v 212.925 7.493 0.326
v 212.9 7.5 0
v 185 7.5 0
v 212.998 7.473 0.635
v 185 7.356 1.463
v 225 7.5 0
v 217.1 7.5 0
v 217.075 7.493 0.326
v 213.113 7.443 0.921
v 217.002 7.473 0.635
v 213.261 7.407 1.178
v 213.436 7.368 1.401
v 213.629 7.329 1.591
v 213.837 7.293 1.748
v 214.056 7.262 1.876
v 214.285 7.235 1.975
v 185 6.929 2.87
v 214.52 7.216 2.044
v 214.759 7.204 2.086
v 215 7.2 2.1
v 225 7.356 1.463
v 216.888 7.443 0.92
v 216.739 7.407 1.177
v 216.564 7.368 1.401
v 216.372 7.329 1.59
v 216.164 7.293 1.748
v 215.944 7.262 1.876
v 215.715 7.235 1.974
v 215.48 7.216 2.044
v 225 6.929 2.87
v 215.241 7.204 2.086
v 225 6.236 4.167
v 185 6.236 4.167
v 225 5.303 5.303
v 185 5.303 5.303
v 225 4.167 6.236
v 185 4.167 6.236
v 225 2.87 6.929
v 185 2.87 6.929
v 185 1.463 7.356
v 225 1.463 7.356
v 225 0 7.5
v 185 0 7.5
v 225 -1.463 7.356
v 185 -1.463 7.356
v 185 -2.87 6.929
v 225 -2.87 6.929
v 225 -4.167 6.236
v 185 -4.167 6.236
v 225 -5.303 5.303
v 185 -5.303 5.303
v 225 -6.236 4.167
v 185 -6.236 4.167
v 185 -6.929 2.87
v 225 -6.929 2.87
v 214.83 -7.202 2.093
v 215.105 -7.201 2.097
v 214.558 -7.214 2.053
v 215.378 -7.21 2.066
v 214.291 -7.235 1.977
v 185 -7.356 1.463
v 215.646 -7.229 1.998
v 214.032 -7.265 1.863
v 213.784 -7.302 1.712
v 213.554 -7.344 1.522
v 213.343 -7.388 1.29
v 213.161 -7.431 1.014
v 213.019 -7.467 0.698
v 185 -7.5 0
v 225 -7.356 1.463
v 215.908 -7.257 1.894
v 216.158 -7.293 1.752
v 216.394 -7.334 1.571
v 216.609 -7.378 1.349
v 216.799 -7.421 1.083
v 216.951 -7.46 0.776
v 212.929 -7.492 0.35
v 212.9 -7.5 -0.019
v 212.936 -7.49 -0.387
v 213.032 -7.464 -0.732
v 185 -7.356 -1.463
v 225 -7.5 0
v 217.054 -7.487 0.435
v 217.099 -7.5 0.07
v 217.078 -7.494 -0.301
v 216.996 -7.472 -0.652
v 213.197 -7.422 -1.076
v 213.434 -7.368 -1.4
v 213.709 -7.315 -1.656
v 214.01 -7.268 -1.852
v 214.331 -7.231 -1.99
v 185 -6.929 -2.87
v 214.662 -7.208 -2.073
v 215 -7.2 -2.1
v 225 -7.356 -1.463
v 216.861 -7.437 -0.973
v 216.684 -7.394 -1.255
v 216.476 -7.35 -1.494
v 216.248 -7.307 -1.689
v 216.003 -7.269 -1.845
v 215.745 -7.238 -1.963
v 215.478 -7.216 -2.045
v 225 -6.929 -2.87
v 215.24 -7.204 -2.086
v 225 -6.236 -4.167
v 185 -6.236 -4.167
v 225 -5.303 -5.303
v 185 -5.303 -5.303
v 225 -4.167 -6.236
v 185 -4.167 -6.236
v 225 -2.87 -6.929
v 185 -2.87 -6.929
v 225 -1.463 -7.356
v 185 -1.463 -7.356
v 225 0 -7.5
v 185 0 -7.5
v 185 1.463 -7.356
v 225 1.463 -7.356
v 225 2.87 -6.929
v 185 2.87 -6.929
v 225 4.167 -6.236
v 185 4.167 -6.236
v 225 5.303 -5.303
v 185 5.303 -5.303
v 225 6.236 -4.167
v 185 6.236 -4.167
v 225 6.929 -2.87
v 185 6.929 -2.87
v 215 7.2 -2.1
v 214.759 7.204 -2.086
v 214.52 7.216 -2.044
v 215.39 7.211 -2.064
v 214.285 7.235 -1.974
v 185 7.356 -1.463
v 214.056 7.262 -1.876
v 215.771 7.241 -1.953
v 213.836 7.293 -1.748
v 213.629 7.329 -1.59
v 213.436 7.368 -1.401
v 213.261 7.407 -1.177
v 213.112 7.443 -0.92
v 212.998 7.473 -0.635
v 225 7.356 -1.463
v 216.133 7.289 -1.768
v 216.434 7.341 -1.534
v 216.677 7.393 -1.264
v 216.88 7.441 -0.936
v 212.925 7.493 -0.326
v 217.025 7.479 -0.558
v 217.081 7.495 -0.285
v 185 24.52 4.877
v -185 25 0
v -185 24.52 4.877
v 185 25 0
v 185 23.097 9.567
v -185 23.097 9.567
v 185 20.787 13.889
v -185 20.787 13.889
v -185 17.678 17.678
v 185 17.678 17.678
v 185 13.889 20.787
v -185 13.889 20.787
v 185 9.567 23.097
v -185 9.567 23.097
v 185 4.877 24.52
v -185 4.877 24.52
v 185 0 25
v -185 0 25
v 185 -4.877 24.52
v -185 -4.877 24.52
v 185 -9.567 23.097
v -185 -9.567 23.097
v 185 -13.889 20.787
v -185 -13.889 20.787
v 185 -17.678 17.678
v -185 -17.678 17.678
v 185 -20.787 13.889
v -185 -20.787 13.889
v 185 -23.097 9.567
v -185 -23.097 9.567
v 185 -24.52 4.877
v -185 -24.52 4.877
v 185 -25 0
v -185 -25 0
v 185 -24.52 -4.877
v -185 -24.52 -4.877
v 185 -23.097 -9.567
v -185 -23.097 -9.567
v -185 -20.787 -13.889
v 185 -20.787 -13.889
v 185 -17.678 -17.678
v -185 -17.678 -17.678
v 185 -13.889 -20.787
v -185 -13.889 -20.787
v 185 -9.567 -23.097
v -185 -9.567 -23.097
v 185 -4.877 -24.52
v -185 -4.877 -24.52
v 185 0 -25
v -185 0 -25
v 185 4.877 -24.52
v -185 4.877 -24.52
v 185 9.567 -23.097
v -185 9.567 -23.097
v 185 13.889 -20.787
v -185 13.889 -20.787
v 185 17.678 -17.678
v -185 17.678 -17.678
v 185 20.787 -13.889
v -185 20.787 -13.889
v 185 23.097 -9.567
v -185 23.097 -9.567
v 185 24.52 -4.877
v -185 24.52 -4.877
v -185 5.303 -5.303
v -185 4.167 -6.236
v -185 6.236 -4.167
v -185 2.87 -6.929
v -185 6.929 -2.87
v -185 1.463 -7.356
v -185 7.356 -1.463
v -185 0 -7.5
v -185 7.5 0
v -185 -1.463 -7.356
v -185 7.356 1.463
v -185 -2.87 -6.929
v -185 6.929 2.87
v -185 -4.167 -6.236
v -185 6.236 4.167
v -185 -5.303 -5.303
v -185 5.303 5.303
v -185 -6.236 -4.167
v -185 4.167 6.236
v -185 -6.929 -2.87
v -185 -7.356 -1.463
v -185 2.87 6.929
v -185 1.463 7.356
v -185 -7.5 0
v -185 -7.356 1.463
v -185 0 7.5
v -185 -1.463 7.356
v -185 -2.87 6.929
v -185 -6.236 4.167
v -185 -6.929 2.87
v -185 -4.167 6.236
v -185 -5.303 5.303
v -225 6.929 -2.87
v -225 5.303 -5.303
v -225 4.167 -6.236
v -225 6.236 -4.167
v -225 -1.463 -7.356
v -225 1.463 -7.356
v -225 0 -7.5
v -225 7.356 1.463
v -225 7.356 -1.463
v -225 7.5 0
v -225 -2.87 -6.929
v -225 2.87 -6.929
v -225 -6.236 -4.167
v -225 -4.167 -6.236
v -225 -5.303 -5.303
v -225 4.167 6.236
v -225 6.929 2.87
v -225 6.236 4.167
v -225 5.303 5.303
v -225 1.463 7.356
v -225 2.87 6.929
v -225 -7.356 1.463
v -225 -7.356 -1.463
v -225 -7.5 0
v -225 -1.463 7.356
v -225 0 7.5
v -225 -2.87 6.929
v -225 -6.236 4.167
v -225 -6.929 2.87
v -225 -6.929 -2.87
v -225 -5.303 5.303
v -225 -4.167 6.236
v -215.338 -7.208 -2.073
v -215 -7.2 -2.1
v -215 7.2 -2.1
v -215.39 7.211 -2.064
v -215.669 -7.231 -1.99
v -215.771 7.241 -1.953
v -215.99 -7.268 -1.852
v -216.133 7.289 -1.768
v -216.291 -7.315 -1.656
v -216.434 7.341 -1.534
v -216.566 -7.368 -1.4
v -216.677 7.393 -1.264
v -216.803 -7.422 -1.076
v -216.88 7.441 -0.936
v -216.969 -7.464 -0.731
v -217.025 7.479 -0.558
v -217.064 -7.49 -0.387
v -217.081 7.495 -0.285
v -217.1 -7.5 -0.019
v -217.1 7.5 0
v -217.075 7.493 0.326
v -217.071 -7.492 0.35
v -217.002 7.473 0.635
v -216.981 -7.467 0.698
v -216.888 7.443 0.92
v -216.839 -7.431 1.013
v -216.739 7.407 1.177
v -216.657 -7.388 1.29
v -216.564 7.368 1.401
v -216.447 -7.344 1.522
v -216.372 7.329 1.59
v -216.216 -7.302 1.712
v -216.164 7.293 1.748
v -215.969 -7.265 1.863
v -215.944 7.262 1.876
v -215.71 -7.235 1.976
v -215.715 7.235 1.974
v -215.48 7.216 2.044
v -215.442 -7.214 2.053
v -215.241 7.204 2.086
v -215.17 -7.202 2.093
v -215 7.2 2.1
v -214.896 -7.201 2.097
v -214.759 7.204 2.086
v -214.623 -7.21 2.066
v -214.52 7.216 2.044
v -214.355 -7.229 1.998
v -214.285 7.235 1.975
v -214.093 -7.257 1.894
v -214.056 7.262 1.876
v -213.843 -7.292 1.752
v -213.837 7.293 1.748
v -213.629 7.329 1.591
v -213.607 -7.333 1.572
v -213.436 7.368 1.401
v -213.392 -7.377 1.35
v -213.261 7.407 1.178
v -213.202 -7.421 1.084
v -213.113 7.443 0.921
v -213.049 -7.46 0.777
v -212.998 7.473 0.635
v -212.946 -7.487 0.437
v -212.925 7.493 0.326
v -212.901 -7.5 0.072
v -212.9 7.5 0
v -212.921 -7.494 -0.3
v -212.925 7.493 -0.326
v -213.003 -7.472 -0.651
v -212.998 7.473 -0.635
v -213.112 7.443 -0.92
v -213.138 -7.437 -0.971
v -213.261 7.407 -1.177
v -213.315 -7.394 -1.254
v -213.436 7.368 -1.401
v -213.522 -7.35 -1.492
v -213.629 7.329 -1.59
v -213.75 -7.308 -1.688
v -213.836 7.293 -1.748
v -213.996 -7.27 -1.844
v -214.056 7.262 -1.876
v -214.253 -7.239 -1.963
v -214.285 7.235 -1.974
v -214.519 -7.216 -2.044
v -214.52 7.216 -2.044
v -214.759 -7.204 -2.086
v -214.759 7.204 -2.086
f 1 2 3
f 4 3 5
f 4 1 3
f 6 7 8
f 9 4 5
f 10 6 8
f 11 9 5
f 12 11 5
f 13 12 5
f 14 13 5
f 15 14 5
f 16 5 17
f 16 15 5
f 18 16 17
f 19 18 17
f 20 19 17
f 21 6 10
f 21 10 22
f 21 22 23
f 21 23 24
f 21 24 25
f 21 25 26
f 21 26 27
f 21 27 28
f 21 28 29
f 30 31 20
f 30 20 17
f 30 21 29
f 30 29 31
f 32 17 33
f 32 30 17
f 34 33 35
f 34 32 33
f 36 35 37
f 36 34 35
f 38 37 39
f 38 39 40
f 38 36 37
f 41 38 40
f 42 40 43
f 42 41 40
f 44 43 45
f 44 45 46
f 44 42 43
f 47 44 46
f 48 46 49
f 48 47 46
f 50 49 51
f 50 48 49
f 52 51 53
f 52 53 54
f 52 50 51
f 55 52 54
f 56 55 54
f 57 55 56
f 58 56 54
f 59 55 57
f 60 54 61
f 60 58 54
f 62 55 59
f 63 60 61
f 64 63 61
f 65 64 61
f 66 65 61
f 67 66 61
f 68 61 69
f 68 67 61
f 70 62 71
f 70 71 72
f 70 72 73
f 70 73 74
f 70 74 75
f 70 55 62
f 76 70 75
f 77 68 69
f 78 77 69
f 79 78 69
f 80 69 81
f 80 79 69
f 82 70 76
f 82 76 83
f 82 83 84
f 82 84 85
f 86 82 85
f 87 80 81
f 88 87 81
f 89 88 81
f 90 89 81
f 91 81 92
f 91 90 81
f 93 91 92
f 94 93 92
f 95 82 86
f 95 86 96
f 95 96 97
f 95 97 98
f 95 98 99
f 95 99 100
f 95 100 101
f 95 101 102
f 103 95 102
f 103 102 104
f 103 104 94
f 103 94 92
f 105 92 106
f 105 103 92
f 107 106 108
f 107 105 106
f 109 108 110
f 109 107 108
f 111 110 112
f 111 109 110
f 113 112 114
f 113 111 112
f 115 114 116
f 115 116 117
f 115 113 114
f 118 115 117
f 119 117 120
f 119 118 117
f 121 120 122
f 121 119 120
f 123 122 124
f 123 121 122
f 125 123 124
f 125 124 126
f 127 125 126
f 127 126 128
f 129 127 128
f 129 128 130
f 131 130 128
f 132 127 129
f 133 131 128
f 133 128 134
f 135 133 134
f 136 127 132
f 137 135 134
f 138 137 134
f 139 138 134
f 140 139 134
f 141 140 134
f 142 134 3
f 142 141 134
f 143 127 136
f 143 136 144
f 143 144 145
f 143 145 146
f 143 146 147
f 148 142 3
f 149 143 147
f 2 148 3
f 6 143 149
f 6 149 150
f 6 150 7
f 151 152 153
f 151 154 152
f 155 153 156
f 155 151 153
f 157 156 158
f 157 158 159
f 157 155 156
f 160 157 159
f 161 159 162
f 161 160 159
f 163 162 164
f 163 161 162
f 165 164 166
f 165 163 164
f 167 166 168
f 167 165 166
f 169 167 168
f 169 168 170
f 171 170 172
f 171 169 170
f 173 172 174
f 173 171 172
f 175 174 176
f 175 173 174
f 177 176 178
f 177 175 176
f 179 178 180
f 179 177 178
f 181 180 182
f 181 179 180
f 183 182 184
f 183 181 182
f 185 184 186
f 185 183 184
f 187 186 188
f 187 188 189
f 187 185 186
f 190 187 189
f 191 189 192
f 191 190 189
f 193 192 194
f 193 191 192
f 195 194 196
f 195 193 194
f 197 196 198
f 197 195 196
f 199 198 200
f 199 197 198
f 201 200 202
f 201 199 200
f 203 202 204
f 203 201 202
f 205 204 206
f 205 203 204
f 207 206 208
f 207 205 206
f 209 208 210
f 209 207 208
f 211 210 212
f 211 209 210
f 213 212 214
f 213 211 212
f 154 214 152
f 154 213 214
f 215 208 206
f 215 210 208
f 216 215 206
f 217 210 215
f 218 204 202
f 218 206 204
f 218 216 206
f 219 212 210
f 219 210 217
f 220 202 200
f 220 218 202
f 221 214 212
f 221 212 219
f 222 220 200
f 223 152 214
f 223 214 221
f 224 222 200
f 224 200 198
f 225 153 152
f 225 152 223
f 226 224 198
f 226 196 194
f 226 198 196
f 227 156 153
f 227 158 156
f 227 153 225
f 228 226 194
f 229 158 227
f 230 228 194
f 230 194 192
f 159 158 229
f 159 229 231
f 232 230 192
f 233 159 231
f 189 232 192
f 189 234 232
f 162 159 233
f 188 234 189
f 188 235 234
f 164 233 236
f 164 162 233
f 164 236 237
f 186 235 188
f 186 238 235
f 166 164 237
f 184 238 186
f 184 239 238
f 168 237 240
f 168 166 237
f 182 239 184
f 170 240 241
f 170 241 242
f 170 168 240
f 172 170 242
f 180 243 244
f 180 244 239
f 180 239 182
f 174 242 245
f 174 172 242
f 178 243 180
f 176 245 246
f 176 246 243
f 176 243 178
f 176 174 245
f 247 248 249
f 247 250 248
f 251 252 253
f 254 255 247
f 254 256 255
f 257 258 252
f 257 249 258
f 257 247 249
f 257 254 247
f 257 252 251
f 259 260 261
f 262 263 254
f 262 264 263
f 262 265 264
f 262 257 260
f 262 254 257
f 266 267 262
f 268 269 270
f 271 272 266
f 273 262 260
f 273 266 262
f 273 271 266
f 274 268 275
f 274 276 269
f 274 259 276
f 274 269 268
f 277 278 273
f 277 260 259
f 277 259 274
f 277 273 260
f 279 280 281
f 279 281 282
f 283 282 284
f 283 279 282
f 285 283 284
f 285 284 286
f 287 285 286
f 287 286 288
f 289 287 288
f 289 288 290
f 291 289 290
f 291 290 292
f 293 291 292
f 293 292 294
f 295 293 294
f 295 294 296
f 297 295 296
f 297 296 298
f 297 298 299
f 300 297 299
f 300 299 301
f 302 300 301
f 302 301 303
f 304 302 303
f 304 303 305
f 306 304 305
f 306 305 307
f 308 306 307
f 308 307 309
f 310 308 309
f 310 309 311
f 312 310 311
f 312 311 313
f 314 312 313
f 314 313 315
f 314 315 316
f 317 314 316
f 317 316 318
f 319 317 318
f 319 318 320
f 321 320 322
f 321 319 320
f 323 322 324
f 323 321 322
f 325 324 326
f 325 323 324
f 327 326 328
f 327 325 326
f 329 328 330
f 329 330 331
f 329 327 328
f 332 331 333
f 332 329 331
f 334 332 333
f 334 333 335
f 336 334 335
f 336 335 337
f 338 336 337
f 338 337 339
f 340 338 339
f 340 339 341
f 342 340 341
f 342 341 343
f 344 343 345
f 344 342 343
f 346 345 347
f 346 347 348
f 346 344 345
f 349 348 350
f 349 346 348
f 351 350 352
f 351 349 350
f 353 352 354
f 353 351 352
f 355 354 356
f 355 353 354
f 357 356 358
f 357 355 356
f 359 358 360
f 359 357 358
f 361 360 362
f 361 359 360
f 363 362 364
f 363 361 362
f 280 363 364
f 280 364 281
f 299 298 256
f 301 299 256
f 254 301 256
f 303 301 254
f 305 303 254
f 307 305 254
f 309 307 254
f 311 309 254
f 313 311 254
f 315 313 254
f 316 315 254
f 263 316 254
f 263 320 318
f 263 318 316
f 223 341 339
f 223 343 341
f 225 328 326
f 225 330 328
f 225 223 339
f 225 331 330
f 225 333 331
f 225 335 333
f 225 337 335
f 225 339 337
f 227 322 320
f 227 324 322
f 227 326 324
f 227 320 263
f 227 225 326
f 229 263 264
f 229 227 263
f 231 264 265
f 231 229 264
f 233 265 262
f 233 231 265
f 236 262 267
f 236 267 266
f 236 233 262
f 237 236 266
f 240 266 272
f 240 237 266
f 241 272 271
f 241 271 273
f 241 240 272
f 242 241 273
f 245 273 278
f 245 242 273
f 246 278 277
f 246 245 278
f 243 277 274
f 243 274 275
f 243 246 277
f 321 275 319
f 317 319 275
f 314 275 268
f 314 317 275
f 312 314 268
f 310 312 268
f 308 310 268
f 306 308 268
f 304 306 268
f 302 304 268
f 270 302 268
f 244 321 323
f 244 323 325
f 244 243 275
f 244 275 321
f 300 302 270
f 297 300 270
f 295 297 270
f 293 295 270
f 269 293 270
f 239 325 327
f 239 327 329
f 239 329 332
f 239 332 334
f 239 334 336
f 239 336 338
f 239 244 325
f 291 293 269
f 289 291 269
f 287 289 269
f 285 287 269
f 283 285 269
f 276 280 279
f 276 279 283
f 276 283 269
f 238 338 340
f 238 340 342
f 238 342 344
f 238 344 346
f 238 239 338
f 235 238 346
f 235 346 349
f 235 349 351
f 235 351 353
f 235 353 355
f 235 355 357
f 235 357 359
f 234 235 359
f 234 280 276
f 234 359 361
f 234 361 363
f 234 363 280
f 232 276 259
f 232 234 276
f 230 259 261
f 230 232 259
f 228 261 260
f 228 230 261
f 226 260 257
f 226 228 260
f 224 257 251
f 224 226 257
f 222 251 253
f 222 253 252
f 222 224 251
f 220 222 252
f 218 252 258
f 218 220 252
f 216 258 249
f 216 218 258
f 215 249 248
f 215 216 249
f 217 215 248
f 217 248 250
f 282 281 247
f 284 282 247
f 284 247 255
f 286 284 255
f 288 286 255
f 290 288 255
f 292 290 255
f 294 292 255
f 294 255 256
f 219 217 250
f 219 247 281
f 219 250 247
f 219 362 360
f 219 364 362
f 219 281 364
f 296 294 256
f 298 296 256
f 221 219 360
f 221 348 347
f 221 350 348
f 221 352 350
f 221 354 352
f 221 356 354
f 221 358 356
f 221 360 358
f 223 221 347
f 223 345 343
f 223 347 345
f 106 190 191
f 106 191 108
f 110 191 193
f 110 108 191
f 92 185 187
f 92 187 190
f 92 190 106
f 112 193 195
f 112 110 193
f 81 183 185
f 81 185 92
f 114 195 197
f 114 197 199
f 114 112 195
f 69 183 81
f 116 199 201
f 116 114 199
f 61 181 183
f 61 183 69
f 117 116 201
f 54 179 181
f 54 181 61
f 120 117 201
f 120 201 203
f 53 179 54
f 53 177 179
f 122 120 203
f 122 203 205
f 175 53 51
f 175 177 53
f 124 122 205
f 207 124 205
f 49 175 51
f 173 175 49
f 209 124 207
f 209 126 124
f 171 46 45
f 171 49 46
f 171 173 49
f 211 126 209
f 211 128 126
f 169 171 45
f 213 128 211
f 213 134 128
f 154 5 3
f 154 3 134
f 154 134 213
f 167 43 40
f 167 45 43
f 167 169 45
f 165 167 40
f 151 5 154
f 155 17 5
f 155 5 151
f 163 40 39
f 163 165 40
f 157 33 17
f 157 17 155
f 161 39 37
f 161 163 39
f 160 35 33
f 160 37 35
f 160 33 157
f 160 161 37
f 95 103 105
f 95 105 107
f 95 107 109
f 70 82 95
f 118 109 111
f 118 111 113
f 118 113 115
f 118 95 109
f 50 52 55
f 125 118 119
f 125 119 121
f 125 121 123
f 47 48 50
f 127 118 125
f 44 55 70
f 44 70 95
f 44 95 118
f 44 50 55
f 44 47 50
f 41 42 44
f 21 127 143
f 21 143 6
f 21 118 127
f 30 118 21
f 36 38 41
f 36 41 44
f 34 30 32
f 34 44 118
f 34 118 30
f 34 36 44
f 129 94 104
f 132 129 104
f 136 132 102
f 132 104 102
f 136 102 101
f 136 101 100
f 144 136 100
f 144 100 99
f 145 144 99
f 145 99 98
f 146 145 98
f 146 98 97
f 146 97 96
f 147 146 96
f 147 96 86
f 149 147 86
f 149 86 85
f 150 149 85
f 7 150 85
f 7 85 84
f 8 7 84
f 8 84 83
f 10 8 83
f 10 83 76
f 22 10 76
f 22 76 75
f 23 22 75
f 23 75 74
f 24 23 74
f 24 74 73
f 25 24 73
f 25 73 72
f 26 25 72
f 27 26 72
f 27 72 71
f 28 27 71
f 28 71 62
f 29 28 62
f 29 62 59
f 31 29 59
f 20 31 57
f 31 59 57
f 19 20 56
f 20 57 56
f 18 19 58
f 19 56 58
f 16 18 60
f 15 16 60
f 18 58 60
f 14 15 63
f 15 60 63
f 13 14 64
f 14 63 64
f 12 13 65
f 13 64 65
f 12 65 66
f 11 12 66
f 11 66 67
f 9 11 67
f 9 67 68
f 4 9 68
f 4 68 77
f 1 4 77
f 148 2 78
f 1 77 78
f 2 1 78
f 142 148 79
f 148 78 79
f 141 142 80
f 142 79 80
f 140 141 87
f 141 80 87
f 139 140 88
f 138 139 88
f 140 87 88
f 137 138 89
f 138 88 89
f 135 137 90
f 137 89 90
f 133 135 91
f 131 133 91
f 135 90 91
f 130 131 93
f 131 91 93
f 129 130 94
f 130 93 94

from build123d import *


with BuildPart() as part:
    # 草图1 → 旋转1 (revolve)
    with BuildSketch(Plane.XY):
        Polygon((-185, 25), (185, 25), (185, 7.5), (225, 7.5), (225, 0), (-225, 0), (-225, 7.5), (-185, 7.5), align=None)
    revolve(axis=Axis((-225, 0, 0), (1, 0, 0)))

    # 草图3 → M5 螺纹孔1 (revolve, cut)
    with BuildSketch(Plane(origin=(-215, -7.5, 0), x_dir=(0, 0, -1), z_dir=(1, 0, 0))):
        Polygon((0, 0), (0, 51.2618073), (2.1, 50), (2.1, 0), align=None)
    hole_wizard_m5_1 = revolve(axis=Axis((-215, -13.85, 0), (0, 1, 0)), mode=Mode.SUBTRACT)

    # 镜向1: M5 螺纹孔1 across plane
    add(hole_wizard_m5_1.mirror(Plane(origin=(0, 0, 0), x_dir=(0, 0, 1), z_dir=(1, 0, 0))), mode=Mode.SUBTRACT)


solid = part.part
